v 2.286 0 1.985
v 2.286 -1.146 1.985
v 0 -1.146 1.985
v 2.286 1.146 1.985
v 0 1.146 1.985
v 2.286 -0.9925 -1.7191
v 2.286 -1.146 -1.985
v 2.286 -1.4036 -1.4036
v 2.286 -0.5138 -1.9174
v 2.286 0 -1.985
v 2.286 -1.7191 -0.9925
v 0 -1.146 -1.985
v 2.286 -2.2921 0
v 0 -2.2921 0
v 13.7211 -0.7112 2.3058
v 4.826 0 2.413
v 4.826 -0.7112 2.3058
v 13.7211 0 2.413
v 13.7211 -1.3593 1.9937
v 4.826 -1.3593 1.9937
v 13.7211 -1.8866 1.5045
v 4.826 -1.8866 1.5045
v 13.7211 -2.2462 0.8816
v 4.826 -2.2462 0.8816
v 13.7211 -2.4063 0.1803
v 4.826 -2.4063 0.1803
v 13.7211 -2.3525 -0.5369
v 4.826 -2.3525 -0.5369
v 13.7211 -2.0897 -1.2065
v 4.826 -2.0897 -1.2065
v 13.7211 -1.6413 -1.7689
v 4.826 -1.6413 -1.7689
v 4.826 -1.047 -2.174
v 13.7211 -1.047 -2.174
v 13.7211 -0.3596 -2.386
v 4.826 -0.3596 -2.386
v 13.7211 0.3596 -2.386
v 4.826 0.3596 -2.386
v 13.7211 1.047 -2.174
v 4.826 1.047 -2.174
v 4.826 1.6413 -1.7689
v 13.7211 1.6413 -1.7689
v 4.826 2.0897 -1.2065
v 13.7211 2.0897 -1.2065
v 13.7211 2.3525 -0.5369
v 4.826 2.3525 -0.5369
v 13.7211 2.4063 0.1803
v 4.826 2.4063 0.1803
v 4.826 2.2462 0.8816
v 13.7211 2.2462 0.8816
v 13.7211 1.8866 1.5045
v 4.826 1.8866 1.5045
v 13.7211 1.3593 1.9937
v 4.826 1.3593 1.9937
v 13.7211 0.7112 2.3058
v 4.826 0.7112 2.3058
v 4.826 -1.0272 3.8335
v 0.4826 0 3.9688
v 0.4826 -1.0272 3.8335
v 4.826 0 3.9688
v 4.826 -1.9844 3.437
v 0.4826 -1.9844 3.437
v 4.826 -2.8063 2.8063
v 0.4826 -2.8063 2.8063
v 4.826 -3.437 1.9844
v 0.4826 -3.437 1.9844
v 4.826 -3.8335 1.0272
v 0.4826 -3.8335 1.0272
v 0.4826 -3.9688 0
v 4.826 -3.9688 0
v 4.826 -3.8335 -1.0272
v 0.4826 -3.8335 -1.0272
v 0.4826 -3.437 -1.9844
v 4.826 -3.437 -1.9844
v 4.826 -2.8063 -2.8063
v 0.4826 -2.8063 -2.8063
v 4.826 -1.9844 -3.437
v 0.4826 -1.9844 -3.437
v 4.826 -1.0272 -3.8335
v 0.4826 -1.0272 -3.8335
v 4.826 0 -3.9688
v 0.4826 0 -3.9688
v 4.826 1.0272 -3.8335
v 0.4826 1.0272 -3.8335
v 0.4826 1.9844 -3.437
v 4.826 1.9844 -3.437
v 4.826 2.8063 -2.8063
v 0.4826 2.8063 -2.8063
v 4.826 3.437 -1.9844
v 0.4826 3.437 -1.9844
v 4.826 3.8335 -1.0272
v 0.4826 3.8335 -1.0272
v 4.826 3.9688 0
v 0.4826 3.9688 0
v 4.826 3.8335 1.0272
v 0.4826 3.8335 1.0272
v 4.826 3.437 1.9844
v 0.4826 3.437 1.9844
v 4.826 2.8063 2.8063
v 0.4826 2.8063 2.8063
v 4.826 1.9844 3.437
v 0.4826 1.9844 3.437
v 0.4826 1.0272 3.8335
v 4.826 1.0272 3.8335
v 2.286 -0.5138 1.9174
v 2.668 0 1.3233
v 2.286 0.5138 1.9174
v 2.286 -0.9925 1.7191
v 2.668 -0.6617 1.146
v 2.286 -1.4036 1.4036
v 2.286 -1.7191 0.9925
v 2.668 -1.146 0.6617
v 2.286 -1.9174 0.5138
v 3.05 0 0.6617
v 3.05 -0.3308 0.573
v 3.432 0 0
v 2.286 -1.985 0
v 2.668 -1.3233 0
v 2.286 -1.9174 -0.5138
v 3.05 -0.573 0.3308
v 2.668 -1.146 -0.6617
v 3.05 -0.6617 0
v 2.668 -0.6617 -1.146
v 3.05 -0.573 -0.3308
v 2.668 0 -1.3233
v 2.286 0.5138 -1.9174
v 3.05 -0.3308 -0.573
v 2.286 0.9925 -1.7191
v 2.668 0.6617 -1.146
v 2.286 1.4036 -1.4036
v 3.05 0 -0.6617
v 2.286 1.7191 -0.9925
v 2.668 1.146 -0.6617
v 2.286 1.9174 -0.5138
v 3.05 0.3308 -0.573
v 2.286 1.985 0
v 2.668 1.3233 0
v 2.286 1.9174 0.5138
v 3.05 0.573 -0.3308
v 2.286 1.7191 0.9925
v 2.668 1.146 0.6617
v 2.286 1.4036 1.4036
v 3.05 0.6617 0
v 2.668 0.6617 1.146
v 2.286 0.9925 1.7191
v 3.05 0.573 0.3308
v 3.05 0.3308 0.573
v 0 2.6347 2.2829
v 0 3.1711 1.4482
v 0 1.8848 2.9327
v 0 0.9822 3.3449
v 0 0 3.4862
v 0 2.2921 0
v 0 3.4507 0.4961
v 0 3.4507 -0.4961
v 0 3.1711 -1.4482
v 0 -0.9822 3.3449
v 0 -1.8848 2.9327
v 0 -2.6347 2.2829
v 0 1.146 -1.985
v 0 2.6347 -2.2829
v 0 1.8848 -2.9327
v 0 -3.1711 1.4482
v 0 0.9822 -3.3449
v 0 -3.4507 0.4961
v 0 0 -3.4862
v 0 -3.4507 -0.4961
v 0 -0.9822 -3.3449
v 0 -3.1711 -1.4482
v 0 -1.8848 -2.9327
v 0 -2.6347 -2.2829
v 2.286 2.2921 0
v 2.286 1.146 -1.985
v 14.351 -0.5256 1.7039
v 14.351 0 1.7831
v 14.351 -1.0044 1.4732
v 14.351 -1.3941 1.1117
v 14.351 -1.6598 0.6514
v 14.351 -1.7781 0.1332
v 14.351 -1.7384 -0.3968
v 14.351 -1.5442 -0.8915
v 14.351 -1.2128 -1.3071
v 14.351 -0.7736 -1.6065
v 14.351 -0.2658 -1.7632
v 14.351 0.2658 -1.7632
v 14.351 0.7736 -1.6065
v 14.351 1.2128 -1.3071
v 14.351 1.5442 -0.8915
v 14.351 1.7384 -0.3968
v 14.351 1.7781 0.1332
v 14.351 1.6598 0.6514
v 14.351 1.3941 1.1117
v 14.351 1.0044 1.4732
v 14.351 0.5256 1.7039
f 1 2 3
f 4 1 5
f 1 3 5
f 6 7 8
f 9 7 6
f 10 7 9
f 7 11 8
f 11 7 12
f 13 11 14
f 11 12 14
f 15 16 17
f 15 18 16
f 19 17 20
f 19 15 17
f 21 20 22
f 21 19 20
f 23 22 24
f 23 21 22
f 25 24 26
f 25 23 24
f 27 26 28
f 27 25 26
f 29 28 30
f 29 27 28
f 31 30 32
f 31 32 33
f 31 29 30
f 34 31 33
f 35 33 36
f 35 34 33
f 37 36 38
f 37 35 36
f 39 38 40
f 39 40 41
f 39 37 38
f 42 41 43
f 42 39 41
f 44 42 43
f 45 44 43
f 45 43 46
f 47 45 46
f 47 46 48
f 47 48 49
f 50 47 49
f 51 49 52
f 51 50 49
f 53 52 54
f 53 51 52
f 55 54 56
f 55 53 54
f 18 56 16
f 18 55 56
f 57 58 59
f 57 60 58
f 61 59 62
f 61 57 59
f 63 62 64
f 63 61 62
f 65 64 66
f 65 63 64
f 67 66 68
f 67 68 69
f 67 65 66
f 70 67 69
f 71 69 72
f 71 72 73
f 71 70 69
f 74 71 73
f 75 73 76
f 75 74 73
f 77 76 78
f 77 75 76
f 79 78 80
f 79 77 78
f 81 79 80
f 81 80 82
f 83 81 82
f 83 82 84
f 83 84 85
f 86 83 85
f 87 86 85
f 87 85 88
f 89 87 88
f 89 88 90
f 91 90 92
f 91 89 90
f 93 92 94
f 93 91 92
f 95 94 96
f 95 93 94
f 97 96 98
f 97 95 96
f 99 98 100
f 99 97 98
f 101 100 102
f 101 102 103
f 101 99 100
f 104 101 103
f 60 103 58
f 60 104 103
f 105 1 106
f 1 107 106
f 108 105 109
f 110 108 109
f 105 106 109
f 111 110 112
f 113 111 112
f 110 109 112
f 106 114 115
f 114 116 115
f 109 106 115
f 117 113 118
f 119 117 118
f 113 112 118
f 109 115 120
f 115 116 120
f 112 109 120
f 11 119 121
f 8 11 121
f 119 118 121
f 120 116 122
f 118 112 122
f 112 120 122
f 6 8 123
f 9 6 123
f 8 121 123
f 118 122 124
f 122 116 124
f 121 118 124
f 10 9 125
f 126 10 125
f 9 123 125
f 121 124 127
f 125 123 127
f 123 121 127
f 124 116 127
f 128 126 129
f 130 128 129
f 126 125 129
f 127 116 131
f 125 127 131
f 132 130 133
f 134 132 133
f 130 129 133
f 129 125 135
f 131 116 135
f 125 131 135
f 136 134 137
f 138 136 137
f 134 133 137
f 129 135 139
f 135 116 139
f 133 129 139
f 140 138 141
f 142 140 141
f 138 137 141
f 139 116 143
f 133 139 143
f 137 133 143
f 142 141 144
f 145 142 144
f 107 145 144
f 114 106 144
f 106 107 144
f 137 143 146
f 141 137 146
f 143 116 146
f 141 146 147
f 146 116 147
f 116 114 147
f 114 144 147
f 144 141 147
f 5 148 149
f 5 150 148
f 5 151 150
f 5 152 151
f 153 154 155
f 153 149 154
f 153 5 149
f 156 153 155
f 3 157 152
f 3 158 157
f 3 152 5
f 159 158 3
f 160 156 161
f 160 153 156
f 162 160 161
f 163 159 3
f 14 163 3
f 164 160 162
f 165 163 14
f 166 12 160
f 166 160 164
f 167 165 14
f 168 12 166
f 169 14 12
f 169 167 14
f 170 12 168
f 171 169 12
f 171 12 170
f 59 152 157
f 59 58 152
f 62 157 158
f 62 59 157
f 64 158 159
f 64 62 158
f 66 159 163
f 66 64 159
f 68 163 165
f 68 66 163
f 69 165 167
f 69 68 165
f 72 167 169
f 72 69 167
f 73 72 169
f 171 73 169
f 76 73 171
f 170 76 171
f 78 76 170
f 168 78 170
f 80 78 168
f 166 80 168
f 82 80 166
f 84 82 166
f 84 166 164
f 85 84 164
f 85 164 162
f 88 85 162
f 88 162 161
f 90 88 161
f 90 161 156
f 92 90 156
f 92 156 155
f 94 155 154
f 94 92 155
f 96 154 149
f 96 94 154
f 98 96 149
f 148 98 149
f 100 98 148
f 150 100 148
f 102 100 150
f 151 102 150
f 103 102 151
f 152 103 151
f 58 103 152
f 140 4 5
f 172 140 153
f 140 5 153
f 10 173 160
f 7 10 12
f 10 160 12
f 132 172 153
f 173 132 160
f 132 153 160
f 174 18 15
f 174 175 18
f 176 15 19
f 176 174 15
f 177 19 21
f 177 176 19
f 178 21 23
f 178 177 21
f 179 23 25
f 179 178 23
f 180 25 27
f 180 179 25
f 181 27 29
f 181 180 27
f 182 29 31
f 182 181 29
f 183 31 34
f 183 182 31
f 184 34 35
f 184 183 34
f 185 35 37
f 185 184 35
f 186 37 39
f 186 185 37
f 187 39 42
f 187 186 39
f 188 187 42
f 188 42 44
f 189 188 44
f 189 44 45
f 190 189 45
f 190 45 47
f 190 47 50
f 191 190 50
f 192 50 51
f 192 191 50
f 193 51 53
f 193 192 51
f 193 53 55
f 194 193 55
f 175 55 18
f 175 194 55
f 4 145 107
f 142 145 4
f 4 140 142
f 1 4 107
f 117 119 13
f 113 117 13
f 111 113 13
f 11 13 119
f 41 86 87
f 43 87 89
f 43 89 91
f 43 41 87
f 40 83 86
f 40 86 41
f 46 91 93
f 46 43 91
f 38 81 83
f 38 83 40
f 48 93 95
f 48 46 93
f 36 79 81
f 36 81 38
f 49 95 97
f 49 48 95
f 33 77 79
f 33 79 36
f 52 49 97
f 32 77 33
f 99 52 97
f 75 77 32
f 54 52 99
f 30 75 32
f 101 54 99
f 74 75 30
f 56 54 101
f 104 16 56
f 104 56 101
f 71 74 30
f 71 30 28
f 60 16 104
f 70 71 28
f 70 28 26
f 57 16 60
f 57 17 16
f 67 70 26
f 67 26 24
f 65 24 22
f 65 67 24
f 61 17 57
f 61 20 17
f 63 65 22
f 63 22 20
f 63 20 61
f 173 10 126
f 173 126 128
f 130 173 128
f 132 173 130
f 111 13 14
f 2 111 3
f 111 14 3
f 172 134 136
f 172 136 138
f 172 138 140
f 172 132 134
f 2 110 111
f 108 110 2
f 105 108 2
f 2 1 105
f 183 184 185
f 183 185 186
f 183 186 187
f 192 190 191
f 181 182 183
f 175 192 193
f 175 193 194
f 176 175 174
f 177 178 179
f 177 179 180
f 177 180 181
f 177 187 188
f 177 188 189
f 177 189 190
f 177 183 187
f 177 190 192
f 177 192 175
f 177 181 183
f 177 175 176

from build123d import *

# Parameters (mm, degrees)
HEX_2_DEPTH = 2.286


with BuildPart() as part:
    # BodySke → Base-Revolve (revolve)
    with BuildSketch(Plane.XY, mode=Mode.PRIVATE) as base_revolve_sk:
        Polygon((0, 0), (0, 3.48615), (0.4826, 3.96875), (4.826, 3.96875), (4.826, 2.413), (13.72108, 2.413), (14.351, 1.78308), (14.351, 0), align=None)
    revolve(base_revolve_sk.sketch.rotate(Axis((-31.75, 0, 0), (1, 0, 0)), 90), axis=Axis((-31.75, 0, 0), (1, 0, 0)))  # turned: the seam where the file's is

    # Sketch2 → Hex-PreBroach (revolve, cut)
    with BuildSketch(Plane.XY, mode=Mode.PRIVATE) as hex_prebroach_sk:
        Polygon((0, 1.98501), (2.286, 1.98501), (3.432046058, 0), (0, 0), align=None)
    revolve(hex_prebroach_sk.sketch.rotate(Axis((0, 0, 0), (1, 0, 0)), 90), axis=Axis((0, 0, 0), (1, 0, 0)), mode=Mode.SUBTRACT)  # turned: the seam where the file's is

    # Sketch3 → Hex 2 (cut)
    with BuildSketch(Plane(origin=(0, 0, 0), x_dir=(0, 0.5, 0.866025404), z_dir=(-1, 0, 0))):
        Polygon((1.146046058, 1.98501), (-1.146046058, 1.98501), (-2.292092116, 0), (-1.146046058, -1.98501), (1.146046058, -1.98501), (2.292092116, 0), align=None)
    extrude(amount=-HEX_2_DEPTH, mode=Mode.SUBTRACT)


solid = part.part
